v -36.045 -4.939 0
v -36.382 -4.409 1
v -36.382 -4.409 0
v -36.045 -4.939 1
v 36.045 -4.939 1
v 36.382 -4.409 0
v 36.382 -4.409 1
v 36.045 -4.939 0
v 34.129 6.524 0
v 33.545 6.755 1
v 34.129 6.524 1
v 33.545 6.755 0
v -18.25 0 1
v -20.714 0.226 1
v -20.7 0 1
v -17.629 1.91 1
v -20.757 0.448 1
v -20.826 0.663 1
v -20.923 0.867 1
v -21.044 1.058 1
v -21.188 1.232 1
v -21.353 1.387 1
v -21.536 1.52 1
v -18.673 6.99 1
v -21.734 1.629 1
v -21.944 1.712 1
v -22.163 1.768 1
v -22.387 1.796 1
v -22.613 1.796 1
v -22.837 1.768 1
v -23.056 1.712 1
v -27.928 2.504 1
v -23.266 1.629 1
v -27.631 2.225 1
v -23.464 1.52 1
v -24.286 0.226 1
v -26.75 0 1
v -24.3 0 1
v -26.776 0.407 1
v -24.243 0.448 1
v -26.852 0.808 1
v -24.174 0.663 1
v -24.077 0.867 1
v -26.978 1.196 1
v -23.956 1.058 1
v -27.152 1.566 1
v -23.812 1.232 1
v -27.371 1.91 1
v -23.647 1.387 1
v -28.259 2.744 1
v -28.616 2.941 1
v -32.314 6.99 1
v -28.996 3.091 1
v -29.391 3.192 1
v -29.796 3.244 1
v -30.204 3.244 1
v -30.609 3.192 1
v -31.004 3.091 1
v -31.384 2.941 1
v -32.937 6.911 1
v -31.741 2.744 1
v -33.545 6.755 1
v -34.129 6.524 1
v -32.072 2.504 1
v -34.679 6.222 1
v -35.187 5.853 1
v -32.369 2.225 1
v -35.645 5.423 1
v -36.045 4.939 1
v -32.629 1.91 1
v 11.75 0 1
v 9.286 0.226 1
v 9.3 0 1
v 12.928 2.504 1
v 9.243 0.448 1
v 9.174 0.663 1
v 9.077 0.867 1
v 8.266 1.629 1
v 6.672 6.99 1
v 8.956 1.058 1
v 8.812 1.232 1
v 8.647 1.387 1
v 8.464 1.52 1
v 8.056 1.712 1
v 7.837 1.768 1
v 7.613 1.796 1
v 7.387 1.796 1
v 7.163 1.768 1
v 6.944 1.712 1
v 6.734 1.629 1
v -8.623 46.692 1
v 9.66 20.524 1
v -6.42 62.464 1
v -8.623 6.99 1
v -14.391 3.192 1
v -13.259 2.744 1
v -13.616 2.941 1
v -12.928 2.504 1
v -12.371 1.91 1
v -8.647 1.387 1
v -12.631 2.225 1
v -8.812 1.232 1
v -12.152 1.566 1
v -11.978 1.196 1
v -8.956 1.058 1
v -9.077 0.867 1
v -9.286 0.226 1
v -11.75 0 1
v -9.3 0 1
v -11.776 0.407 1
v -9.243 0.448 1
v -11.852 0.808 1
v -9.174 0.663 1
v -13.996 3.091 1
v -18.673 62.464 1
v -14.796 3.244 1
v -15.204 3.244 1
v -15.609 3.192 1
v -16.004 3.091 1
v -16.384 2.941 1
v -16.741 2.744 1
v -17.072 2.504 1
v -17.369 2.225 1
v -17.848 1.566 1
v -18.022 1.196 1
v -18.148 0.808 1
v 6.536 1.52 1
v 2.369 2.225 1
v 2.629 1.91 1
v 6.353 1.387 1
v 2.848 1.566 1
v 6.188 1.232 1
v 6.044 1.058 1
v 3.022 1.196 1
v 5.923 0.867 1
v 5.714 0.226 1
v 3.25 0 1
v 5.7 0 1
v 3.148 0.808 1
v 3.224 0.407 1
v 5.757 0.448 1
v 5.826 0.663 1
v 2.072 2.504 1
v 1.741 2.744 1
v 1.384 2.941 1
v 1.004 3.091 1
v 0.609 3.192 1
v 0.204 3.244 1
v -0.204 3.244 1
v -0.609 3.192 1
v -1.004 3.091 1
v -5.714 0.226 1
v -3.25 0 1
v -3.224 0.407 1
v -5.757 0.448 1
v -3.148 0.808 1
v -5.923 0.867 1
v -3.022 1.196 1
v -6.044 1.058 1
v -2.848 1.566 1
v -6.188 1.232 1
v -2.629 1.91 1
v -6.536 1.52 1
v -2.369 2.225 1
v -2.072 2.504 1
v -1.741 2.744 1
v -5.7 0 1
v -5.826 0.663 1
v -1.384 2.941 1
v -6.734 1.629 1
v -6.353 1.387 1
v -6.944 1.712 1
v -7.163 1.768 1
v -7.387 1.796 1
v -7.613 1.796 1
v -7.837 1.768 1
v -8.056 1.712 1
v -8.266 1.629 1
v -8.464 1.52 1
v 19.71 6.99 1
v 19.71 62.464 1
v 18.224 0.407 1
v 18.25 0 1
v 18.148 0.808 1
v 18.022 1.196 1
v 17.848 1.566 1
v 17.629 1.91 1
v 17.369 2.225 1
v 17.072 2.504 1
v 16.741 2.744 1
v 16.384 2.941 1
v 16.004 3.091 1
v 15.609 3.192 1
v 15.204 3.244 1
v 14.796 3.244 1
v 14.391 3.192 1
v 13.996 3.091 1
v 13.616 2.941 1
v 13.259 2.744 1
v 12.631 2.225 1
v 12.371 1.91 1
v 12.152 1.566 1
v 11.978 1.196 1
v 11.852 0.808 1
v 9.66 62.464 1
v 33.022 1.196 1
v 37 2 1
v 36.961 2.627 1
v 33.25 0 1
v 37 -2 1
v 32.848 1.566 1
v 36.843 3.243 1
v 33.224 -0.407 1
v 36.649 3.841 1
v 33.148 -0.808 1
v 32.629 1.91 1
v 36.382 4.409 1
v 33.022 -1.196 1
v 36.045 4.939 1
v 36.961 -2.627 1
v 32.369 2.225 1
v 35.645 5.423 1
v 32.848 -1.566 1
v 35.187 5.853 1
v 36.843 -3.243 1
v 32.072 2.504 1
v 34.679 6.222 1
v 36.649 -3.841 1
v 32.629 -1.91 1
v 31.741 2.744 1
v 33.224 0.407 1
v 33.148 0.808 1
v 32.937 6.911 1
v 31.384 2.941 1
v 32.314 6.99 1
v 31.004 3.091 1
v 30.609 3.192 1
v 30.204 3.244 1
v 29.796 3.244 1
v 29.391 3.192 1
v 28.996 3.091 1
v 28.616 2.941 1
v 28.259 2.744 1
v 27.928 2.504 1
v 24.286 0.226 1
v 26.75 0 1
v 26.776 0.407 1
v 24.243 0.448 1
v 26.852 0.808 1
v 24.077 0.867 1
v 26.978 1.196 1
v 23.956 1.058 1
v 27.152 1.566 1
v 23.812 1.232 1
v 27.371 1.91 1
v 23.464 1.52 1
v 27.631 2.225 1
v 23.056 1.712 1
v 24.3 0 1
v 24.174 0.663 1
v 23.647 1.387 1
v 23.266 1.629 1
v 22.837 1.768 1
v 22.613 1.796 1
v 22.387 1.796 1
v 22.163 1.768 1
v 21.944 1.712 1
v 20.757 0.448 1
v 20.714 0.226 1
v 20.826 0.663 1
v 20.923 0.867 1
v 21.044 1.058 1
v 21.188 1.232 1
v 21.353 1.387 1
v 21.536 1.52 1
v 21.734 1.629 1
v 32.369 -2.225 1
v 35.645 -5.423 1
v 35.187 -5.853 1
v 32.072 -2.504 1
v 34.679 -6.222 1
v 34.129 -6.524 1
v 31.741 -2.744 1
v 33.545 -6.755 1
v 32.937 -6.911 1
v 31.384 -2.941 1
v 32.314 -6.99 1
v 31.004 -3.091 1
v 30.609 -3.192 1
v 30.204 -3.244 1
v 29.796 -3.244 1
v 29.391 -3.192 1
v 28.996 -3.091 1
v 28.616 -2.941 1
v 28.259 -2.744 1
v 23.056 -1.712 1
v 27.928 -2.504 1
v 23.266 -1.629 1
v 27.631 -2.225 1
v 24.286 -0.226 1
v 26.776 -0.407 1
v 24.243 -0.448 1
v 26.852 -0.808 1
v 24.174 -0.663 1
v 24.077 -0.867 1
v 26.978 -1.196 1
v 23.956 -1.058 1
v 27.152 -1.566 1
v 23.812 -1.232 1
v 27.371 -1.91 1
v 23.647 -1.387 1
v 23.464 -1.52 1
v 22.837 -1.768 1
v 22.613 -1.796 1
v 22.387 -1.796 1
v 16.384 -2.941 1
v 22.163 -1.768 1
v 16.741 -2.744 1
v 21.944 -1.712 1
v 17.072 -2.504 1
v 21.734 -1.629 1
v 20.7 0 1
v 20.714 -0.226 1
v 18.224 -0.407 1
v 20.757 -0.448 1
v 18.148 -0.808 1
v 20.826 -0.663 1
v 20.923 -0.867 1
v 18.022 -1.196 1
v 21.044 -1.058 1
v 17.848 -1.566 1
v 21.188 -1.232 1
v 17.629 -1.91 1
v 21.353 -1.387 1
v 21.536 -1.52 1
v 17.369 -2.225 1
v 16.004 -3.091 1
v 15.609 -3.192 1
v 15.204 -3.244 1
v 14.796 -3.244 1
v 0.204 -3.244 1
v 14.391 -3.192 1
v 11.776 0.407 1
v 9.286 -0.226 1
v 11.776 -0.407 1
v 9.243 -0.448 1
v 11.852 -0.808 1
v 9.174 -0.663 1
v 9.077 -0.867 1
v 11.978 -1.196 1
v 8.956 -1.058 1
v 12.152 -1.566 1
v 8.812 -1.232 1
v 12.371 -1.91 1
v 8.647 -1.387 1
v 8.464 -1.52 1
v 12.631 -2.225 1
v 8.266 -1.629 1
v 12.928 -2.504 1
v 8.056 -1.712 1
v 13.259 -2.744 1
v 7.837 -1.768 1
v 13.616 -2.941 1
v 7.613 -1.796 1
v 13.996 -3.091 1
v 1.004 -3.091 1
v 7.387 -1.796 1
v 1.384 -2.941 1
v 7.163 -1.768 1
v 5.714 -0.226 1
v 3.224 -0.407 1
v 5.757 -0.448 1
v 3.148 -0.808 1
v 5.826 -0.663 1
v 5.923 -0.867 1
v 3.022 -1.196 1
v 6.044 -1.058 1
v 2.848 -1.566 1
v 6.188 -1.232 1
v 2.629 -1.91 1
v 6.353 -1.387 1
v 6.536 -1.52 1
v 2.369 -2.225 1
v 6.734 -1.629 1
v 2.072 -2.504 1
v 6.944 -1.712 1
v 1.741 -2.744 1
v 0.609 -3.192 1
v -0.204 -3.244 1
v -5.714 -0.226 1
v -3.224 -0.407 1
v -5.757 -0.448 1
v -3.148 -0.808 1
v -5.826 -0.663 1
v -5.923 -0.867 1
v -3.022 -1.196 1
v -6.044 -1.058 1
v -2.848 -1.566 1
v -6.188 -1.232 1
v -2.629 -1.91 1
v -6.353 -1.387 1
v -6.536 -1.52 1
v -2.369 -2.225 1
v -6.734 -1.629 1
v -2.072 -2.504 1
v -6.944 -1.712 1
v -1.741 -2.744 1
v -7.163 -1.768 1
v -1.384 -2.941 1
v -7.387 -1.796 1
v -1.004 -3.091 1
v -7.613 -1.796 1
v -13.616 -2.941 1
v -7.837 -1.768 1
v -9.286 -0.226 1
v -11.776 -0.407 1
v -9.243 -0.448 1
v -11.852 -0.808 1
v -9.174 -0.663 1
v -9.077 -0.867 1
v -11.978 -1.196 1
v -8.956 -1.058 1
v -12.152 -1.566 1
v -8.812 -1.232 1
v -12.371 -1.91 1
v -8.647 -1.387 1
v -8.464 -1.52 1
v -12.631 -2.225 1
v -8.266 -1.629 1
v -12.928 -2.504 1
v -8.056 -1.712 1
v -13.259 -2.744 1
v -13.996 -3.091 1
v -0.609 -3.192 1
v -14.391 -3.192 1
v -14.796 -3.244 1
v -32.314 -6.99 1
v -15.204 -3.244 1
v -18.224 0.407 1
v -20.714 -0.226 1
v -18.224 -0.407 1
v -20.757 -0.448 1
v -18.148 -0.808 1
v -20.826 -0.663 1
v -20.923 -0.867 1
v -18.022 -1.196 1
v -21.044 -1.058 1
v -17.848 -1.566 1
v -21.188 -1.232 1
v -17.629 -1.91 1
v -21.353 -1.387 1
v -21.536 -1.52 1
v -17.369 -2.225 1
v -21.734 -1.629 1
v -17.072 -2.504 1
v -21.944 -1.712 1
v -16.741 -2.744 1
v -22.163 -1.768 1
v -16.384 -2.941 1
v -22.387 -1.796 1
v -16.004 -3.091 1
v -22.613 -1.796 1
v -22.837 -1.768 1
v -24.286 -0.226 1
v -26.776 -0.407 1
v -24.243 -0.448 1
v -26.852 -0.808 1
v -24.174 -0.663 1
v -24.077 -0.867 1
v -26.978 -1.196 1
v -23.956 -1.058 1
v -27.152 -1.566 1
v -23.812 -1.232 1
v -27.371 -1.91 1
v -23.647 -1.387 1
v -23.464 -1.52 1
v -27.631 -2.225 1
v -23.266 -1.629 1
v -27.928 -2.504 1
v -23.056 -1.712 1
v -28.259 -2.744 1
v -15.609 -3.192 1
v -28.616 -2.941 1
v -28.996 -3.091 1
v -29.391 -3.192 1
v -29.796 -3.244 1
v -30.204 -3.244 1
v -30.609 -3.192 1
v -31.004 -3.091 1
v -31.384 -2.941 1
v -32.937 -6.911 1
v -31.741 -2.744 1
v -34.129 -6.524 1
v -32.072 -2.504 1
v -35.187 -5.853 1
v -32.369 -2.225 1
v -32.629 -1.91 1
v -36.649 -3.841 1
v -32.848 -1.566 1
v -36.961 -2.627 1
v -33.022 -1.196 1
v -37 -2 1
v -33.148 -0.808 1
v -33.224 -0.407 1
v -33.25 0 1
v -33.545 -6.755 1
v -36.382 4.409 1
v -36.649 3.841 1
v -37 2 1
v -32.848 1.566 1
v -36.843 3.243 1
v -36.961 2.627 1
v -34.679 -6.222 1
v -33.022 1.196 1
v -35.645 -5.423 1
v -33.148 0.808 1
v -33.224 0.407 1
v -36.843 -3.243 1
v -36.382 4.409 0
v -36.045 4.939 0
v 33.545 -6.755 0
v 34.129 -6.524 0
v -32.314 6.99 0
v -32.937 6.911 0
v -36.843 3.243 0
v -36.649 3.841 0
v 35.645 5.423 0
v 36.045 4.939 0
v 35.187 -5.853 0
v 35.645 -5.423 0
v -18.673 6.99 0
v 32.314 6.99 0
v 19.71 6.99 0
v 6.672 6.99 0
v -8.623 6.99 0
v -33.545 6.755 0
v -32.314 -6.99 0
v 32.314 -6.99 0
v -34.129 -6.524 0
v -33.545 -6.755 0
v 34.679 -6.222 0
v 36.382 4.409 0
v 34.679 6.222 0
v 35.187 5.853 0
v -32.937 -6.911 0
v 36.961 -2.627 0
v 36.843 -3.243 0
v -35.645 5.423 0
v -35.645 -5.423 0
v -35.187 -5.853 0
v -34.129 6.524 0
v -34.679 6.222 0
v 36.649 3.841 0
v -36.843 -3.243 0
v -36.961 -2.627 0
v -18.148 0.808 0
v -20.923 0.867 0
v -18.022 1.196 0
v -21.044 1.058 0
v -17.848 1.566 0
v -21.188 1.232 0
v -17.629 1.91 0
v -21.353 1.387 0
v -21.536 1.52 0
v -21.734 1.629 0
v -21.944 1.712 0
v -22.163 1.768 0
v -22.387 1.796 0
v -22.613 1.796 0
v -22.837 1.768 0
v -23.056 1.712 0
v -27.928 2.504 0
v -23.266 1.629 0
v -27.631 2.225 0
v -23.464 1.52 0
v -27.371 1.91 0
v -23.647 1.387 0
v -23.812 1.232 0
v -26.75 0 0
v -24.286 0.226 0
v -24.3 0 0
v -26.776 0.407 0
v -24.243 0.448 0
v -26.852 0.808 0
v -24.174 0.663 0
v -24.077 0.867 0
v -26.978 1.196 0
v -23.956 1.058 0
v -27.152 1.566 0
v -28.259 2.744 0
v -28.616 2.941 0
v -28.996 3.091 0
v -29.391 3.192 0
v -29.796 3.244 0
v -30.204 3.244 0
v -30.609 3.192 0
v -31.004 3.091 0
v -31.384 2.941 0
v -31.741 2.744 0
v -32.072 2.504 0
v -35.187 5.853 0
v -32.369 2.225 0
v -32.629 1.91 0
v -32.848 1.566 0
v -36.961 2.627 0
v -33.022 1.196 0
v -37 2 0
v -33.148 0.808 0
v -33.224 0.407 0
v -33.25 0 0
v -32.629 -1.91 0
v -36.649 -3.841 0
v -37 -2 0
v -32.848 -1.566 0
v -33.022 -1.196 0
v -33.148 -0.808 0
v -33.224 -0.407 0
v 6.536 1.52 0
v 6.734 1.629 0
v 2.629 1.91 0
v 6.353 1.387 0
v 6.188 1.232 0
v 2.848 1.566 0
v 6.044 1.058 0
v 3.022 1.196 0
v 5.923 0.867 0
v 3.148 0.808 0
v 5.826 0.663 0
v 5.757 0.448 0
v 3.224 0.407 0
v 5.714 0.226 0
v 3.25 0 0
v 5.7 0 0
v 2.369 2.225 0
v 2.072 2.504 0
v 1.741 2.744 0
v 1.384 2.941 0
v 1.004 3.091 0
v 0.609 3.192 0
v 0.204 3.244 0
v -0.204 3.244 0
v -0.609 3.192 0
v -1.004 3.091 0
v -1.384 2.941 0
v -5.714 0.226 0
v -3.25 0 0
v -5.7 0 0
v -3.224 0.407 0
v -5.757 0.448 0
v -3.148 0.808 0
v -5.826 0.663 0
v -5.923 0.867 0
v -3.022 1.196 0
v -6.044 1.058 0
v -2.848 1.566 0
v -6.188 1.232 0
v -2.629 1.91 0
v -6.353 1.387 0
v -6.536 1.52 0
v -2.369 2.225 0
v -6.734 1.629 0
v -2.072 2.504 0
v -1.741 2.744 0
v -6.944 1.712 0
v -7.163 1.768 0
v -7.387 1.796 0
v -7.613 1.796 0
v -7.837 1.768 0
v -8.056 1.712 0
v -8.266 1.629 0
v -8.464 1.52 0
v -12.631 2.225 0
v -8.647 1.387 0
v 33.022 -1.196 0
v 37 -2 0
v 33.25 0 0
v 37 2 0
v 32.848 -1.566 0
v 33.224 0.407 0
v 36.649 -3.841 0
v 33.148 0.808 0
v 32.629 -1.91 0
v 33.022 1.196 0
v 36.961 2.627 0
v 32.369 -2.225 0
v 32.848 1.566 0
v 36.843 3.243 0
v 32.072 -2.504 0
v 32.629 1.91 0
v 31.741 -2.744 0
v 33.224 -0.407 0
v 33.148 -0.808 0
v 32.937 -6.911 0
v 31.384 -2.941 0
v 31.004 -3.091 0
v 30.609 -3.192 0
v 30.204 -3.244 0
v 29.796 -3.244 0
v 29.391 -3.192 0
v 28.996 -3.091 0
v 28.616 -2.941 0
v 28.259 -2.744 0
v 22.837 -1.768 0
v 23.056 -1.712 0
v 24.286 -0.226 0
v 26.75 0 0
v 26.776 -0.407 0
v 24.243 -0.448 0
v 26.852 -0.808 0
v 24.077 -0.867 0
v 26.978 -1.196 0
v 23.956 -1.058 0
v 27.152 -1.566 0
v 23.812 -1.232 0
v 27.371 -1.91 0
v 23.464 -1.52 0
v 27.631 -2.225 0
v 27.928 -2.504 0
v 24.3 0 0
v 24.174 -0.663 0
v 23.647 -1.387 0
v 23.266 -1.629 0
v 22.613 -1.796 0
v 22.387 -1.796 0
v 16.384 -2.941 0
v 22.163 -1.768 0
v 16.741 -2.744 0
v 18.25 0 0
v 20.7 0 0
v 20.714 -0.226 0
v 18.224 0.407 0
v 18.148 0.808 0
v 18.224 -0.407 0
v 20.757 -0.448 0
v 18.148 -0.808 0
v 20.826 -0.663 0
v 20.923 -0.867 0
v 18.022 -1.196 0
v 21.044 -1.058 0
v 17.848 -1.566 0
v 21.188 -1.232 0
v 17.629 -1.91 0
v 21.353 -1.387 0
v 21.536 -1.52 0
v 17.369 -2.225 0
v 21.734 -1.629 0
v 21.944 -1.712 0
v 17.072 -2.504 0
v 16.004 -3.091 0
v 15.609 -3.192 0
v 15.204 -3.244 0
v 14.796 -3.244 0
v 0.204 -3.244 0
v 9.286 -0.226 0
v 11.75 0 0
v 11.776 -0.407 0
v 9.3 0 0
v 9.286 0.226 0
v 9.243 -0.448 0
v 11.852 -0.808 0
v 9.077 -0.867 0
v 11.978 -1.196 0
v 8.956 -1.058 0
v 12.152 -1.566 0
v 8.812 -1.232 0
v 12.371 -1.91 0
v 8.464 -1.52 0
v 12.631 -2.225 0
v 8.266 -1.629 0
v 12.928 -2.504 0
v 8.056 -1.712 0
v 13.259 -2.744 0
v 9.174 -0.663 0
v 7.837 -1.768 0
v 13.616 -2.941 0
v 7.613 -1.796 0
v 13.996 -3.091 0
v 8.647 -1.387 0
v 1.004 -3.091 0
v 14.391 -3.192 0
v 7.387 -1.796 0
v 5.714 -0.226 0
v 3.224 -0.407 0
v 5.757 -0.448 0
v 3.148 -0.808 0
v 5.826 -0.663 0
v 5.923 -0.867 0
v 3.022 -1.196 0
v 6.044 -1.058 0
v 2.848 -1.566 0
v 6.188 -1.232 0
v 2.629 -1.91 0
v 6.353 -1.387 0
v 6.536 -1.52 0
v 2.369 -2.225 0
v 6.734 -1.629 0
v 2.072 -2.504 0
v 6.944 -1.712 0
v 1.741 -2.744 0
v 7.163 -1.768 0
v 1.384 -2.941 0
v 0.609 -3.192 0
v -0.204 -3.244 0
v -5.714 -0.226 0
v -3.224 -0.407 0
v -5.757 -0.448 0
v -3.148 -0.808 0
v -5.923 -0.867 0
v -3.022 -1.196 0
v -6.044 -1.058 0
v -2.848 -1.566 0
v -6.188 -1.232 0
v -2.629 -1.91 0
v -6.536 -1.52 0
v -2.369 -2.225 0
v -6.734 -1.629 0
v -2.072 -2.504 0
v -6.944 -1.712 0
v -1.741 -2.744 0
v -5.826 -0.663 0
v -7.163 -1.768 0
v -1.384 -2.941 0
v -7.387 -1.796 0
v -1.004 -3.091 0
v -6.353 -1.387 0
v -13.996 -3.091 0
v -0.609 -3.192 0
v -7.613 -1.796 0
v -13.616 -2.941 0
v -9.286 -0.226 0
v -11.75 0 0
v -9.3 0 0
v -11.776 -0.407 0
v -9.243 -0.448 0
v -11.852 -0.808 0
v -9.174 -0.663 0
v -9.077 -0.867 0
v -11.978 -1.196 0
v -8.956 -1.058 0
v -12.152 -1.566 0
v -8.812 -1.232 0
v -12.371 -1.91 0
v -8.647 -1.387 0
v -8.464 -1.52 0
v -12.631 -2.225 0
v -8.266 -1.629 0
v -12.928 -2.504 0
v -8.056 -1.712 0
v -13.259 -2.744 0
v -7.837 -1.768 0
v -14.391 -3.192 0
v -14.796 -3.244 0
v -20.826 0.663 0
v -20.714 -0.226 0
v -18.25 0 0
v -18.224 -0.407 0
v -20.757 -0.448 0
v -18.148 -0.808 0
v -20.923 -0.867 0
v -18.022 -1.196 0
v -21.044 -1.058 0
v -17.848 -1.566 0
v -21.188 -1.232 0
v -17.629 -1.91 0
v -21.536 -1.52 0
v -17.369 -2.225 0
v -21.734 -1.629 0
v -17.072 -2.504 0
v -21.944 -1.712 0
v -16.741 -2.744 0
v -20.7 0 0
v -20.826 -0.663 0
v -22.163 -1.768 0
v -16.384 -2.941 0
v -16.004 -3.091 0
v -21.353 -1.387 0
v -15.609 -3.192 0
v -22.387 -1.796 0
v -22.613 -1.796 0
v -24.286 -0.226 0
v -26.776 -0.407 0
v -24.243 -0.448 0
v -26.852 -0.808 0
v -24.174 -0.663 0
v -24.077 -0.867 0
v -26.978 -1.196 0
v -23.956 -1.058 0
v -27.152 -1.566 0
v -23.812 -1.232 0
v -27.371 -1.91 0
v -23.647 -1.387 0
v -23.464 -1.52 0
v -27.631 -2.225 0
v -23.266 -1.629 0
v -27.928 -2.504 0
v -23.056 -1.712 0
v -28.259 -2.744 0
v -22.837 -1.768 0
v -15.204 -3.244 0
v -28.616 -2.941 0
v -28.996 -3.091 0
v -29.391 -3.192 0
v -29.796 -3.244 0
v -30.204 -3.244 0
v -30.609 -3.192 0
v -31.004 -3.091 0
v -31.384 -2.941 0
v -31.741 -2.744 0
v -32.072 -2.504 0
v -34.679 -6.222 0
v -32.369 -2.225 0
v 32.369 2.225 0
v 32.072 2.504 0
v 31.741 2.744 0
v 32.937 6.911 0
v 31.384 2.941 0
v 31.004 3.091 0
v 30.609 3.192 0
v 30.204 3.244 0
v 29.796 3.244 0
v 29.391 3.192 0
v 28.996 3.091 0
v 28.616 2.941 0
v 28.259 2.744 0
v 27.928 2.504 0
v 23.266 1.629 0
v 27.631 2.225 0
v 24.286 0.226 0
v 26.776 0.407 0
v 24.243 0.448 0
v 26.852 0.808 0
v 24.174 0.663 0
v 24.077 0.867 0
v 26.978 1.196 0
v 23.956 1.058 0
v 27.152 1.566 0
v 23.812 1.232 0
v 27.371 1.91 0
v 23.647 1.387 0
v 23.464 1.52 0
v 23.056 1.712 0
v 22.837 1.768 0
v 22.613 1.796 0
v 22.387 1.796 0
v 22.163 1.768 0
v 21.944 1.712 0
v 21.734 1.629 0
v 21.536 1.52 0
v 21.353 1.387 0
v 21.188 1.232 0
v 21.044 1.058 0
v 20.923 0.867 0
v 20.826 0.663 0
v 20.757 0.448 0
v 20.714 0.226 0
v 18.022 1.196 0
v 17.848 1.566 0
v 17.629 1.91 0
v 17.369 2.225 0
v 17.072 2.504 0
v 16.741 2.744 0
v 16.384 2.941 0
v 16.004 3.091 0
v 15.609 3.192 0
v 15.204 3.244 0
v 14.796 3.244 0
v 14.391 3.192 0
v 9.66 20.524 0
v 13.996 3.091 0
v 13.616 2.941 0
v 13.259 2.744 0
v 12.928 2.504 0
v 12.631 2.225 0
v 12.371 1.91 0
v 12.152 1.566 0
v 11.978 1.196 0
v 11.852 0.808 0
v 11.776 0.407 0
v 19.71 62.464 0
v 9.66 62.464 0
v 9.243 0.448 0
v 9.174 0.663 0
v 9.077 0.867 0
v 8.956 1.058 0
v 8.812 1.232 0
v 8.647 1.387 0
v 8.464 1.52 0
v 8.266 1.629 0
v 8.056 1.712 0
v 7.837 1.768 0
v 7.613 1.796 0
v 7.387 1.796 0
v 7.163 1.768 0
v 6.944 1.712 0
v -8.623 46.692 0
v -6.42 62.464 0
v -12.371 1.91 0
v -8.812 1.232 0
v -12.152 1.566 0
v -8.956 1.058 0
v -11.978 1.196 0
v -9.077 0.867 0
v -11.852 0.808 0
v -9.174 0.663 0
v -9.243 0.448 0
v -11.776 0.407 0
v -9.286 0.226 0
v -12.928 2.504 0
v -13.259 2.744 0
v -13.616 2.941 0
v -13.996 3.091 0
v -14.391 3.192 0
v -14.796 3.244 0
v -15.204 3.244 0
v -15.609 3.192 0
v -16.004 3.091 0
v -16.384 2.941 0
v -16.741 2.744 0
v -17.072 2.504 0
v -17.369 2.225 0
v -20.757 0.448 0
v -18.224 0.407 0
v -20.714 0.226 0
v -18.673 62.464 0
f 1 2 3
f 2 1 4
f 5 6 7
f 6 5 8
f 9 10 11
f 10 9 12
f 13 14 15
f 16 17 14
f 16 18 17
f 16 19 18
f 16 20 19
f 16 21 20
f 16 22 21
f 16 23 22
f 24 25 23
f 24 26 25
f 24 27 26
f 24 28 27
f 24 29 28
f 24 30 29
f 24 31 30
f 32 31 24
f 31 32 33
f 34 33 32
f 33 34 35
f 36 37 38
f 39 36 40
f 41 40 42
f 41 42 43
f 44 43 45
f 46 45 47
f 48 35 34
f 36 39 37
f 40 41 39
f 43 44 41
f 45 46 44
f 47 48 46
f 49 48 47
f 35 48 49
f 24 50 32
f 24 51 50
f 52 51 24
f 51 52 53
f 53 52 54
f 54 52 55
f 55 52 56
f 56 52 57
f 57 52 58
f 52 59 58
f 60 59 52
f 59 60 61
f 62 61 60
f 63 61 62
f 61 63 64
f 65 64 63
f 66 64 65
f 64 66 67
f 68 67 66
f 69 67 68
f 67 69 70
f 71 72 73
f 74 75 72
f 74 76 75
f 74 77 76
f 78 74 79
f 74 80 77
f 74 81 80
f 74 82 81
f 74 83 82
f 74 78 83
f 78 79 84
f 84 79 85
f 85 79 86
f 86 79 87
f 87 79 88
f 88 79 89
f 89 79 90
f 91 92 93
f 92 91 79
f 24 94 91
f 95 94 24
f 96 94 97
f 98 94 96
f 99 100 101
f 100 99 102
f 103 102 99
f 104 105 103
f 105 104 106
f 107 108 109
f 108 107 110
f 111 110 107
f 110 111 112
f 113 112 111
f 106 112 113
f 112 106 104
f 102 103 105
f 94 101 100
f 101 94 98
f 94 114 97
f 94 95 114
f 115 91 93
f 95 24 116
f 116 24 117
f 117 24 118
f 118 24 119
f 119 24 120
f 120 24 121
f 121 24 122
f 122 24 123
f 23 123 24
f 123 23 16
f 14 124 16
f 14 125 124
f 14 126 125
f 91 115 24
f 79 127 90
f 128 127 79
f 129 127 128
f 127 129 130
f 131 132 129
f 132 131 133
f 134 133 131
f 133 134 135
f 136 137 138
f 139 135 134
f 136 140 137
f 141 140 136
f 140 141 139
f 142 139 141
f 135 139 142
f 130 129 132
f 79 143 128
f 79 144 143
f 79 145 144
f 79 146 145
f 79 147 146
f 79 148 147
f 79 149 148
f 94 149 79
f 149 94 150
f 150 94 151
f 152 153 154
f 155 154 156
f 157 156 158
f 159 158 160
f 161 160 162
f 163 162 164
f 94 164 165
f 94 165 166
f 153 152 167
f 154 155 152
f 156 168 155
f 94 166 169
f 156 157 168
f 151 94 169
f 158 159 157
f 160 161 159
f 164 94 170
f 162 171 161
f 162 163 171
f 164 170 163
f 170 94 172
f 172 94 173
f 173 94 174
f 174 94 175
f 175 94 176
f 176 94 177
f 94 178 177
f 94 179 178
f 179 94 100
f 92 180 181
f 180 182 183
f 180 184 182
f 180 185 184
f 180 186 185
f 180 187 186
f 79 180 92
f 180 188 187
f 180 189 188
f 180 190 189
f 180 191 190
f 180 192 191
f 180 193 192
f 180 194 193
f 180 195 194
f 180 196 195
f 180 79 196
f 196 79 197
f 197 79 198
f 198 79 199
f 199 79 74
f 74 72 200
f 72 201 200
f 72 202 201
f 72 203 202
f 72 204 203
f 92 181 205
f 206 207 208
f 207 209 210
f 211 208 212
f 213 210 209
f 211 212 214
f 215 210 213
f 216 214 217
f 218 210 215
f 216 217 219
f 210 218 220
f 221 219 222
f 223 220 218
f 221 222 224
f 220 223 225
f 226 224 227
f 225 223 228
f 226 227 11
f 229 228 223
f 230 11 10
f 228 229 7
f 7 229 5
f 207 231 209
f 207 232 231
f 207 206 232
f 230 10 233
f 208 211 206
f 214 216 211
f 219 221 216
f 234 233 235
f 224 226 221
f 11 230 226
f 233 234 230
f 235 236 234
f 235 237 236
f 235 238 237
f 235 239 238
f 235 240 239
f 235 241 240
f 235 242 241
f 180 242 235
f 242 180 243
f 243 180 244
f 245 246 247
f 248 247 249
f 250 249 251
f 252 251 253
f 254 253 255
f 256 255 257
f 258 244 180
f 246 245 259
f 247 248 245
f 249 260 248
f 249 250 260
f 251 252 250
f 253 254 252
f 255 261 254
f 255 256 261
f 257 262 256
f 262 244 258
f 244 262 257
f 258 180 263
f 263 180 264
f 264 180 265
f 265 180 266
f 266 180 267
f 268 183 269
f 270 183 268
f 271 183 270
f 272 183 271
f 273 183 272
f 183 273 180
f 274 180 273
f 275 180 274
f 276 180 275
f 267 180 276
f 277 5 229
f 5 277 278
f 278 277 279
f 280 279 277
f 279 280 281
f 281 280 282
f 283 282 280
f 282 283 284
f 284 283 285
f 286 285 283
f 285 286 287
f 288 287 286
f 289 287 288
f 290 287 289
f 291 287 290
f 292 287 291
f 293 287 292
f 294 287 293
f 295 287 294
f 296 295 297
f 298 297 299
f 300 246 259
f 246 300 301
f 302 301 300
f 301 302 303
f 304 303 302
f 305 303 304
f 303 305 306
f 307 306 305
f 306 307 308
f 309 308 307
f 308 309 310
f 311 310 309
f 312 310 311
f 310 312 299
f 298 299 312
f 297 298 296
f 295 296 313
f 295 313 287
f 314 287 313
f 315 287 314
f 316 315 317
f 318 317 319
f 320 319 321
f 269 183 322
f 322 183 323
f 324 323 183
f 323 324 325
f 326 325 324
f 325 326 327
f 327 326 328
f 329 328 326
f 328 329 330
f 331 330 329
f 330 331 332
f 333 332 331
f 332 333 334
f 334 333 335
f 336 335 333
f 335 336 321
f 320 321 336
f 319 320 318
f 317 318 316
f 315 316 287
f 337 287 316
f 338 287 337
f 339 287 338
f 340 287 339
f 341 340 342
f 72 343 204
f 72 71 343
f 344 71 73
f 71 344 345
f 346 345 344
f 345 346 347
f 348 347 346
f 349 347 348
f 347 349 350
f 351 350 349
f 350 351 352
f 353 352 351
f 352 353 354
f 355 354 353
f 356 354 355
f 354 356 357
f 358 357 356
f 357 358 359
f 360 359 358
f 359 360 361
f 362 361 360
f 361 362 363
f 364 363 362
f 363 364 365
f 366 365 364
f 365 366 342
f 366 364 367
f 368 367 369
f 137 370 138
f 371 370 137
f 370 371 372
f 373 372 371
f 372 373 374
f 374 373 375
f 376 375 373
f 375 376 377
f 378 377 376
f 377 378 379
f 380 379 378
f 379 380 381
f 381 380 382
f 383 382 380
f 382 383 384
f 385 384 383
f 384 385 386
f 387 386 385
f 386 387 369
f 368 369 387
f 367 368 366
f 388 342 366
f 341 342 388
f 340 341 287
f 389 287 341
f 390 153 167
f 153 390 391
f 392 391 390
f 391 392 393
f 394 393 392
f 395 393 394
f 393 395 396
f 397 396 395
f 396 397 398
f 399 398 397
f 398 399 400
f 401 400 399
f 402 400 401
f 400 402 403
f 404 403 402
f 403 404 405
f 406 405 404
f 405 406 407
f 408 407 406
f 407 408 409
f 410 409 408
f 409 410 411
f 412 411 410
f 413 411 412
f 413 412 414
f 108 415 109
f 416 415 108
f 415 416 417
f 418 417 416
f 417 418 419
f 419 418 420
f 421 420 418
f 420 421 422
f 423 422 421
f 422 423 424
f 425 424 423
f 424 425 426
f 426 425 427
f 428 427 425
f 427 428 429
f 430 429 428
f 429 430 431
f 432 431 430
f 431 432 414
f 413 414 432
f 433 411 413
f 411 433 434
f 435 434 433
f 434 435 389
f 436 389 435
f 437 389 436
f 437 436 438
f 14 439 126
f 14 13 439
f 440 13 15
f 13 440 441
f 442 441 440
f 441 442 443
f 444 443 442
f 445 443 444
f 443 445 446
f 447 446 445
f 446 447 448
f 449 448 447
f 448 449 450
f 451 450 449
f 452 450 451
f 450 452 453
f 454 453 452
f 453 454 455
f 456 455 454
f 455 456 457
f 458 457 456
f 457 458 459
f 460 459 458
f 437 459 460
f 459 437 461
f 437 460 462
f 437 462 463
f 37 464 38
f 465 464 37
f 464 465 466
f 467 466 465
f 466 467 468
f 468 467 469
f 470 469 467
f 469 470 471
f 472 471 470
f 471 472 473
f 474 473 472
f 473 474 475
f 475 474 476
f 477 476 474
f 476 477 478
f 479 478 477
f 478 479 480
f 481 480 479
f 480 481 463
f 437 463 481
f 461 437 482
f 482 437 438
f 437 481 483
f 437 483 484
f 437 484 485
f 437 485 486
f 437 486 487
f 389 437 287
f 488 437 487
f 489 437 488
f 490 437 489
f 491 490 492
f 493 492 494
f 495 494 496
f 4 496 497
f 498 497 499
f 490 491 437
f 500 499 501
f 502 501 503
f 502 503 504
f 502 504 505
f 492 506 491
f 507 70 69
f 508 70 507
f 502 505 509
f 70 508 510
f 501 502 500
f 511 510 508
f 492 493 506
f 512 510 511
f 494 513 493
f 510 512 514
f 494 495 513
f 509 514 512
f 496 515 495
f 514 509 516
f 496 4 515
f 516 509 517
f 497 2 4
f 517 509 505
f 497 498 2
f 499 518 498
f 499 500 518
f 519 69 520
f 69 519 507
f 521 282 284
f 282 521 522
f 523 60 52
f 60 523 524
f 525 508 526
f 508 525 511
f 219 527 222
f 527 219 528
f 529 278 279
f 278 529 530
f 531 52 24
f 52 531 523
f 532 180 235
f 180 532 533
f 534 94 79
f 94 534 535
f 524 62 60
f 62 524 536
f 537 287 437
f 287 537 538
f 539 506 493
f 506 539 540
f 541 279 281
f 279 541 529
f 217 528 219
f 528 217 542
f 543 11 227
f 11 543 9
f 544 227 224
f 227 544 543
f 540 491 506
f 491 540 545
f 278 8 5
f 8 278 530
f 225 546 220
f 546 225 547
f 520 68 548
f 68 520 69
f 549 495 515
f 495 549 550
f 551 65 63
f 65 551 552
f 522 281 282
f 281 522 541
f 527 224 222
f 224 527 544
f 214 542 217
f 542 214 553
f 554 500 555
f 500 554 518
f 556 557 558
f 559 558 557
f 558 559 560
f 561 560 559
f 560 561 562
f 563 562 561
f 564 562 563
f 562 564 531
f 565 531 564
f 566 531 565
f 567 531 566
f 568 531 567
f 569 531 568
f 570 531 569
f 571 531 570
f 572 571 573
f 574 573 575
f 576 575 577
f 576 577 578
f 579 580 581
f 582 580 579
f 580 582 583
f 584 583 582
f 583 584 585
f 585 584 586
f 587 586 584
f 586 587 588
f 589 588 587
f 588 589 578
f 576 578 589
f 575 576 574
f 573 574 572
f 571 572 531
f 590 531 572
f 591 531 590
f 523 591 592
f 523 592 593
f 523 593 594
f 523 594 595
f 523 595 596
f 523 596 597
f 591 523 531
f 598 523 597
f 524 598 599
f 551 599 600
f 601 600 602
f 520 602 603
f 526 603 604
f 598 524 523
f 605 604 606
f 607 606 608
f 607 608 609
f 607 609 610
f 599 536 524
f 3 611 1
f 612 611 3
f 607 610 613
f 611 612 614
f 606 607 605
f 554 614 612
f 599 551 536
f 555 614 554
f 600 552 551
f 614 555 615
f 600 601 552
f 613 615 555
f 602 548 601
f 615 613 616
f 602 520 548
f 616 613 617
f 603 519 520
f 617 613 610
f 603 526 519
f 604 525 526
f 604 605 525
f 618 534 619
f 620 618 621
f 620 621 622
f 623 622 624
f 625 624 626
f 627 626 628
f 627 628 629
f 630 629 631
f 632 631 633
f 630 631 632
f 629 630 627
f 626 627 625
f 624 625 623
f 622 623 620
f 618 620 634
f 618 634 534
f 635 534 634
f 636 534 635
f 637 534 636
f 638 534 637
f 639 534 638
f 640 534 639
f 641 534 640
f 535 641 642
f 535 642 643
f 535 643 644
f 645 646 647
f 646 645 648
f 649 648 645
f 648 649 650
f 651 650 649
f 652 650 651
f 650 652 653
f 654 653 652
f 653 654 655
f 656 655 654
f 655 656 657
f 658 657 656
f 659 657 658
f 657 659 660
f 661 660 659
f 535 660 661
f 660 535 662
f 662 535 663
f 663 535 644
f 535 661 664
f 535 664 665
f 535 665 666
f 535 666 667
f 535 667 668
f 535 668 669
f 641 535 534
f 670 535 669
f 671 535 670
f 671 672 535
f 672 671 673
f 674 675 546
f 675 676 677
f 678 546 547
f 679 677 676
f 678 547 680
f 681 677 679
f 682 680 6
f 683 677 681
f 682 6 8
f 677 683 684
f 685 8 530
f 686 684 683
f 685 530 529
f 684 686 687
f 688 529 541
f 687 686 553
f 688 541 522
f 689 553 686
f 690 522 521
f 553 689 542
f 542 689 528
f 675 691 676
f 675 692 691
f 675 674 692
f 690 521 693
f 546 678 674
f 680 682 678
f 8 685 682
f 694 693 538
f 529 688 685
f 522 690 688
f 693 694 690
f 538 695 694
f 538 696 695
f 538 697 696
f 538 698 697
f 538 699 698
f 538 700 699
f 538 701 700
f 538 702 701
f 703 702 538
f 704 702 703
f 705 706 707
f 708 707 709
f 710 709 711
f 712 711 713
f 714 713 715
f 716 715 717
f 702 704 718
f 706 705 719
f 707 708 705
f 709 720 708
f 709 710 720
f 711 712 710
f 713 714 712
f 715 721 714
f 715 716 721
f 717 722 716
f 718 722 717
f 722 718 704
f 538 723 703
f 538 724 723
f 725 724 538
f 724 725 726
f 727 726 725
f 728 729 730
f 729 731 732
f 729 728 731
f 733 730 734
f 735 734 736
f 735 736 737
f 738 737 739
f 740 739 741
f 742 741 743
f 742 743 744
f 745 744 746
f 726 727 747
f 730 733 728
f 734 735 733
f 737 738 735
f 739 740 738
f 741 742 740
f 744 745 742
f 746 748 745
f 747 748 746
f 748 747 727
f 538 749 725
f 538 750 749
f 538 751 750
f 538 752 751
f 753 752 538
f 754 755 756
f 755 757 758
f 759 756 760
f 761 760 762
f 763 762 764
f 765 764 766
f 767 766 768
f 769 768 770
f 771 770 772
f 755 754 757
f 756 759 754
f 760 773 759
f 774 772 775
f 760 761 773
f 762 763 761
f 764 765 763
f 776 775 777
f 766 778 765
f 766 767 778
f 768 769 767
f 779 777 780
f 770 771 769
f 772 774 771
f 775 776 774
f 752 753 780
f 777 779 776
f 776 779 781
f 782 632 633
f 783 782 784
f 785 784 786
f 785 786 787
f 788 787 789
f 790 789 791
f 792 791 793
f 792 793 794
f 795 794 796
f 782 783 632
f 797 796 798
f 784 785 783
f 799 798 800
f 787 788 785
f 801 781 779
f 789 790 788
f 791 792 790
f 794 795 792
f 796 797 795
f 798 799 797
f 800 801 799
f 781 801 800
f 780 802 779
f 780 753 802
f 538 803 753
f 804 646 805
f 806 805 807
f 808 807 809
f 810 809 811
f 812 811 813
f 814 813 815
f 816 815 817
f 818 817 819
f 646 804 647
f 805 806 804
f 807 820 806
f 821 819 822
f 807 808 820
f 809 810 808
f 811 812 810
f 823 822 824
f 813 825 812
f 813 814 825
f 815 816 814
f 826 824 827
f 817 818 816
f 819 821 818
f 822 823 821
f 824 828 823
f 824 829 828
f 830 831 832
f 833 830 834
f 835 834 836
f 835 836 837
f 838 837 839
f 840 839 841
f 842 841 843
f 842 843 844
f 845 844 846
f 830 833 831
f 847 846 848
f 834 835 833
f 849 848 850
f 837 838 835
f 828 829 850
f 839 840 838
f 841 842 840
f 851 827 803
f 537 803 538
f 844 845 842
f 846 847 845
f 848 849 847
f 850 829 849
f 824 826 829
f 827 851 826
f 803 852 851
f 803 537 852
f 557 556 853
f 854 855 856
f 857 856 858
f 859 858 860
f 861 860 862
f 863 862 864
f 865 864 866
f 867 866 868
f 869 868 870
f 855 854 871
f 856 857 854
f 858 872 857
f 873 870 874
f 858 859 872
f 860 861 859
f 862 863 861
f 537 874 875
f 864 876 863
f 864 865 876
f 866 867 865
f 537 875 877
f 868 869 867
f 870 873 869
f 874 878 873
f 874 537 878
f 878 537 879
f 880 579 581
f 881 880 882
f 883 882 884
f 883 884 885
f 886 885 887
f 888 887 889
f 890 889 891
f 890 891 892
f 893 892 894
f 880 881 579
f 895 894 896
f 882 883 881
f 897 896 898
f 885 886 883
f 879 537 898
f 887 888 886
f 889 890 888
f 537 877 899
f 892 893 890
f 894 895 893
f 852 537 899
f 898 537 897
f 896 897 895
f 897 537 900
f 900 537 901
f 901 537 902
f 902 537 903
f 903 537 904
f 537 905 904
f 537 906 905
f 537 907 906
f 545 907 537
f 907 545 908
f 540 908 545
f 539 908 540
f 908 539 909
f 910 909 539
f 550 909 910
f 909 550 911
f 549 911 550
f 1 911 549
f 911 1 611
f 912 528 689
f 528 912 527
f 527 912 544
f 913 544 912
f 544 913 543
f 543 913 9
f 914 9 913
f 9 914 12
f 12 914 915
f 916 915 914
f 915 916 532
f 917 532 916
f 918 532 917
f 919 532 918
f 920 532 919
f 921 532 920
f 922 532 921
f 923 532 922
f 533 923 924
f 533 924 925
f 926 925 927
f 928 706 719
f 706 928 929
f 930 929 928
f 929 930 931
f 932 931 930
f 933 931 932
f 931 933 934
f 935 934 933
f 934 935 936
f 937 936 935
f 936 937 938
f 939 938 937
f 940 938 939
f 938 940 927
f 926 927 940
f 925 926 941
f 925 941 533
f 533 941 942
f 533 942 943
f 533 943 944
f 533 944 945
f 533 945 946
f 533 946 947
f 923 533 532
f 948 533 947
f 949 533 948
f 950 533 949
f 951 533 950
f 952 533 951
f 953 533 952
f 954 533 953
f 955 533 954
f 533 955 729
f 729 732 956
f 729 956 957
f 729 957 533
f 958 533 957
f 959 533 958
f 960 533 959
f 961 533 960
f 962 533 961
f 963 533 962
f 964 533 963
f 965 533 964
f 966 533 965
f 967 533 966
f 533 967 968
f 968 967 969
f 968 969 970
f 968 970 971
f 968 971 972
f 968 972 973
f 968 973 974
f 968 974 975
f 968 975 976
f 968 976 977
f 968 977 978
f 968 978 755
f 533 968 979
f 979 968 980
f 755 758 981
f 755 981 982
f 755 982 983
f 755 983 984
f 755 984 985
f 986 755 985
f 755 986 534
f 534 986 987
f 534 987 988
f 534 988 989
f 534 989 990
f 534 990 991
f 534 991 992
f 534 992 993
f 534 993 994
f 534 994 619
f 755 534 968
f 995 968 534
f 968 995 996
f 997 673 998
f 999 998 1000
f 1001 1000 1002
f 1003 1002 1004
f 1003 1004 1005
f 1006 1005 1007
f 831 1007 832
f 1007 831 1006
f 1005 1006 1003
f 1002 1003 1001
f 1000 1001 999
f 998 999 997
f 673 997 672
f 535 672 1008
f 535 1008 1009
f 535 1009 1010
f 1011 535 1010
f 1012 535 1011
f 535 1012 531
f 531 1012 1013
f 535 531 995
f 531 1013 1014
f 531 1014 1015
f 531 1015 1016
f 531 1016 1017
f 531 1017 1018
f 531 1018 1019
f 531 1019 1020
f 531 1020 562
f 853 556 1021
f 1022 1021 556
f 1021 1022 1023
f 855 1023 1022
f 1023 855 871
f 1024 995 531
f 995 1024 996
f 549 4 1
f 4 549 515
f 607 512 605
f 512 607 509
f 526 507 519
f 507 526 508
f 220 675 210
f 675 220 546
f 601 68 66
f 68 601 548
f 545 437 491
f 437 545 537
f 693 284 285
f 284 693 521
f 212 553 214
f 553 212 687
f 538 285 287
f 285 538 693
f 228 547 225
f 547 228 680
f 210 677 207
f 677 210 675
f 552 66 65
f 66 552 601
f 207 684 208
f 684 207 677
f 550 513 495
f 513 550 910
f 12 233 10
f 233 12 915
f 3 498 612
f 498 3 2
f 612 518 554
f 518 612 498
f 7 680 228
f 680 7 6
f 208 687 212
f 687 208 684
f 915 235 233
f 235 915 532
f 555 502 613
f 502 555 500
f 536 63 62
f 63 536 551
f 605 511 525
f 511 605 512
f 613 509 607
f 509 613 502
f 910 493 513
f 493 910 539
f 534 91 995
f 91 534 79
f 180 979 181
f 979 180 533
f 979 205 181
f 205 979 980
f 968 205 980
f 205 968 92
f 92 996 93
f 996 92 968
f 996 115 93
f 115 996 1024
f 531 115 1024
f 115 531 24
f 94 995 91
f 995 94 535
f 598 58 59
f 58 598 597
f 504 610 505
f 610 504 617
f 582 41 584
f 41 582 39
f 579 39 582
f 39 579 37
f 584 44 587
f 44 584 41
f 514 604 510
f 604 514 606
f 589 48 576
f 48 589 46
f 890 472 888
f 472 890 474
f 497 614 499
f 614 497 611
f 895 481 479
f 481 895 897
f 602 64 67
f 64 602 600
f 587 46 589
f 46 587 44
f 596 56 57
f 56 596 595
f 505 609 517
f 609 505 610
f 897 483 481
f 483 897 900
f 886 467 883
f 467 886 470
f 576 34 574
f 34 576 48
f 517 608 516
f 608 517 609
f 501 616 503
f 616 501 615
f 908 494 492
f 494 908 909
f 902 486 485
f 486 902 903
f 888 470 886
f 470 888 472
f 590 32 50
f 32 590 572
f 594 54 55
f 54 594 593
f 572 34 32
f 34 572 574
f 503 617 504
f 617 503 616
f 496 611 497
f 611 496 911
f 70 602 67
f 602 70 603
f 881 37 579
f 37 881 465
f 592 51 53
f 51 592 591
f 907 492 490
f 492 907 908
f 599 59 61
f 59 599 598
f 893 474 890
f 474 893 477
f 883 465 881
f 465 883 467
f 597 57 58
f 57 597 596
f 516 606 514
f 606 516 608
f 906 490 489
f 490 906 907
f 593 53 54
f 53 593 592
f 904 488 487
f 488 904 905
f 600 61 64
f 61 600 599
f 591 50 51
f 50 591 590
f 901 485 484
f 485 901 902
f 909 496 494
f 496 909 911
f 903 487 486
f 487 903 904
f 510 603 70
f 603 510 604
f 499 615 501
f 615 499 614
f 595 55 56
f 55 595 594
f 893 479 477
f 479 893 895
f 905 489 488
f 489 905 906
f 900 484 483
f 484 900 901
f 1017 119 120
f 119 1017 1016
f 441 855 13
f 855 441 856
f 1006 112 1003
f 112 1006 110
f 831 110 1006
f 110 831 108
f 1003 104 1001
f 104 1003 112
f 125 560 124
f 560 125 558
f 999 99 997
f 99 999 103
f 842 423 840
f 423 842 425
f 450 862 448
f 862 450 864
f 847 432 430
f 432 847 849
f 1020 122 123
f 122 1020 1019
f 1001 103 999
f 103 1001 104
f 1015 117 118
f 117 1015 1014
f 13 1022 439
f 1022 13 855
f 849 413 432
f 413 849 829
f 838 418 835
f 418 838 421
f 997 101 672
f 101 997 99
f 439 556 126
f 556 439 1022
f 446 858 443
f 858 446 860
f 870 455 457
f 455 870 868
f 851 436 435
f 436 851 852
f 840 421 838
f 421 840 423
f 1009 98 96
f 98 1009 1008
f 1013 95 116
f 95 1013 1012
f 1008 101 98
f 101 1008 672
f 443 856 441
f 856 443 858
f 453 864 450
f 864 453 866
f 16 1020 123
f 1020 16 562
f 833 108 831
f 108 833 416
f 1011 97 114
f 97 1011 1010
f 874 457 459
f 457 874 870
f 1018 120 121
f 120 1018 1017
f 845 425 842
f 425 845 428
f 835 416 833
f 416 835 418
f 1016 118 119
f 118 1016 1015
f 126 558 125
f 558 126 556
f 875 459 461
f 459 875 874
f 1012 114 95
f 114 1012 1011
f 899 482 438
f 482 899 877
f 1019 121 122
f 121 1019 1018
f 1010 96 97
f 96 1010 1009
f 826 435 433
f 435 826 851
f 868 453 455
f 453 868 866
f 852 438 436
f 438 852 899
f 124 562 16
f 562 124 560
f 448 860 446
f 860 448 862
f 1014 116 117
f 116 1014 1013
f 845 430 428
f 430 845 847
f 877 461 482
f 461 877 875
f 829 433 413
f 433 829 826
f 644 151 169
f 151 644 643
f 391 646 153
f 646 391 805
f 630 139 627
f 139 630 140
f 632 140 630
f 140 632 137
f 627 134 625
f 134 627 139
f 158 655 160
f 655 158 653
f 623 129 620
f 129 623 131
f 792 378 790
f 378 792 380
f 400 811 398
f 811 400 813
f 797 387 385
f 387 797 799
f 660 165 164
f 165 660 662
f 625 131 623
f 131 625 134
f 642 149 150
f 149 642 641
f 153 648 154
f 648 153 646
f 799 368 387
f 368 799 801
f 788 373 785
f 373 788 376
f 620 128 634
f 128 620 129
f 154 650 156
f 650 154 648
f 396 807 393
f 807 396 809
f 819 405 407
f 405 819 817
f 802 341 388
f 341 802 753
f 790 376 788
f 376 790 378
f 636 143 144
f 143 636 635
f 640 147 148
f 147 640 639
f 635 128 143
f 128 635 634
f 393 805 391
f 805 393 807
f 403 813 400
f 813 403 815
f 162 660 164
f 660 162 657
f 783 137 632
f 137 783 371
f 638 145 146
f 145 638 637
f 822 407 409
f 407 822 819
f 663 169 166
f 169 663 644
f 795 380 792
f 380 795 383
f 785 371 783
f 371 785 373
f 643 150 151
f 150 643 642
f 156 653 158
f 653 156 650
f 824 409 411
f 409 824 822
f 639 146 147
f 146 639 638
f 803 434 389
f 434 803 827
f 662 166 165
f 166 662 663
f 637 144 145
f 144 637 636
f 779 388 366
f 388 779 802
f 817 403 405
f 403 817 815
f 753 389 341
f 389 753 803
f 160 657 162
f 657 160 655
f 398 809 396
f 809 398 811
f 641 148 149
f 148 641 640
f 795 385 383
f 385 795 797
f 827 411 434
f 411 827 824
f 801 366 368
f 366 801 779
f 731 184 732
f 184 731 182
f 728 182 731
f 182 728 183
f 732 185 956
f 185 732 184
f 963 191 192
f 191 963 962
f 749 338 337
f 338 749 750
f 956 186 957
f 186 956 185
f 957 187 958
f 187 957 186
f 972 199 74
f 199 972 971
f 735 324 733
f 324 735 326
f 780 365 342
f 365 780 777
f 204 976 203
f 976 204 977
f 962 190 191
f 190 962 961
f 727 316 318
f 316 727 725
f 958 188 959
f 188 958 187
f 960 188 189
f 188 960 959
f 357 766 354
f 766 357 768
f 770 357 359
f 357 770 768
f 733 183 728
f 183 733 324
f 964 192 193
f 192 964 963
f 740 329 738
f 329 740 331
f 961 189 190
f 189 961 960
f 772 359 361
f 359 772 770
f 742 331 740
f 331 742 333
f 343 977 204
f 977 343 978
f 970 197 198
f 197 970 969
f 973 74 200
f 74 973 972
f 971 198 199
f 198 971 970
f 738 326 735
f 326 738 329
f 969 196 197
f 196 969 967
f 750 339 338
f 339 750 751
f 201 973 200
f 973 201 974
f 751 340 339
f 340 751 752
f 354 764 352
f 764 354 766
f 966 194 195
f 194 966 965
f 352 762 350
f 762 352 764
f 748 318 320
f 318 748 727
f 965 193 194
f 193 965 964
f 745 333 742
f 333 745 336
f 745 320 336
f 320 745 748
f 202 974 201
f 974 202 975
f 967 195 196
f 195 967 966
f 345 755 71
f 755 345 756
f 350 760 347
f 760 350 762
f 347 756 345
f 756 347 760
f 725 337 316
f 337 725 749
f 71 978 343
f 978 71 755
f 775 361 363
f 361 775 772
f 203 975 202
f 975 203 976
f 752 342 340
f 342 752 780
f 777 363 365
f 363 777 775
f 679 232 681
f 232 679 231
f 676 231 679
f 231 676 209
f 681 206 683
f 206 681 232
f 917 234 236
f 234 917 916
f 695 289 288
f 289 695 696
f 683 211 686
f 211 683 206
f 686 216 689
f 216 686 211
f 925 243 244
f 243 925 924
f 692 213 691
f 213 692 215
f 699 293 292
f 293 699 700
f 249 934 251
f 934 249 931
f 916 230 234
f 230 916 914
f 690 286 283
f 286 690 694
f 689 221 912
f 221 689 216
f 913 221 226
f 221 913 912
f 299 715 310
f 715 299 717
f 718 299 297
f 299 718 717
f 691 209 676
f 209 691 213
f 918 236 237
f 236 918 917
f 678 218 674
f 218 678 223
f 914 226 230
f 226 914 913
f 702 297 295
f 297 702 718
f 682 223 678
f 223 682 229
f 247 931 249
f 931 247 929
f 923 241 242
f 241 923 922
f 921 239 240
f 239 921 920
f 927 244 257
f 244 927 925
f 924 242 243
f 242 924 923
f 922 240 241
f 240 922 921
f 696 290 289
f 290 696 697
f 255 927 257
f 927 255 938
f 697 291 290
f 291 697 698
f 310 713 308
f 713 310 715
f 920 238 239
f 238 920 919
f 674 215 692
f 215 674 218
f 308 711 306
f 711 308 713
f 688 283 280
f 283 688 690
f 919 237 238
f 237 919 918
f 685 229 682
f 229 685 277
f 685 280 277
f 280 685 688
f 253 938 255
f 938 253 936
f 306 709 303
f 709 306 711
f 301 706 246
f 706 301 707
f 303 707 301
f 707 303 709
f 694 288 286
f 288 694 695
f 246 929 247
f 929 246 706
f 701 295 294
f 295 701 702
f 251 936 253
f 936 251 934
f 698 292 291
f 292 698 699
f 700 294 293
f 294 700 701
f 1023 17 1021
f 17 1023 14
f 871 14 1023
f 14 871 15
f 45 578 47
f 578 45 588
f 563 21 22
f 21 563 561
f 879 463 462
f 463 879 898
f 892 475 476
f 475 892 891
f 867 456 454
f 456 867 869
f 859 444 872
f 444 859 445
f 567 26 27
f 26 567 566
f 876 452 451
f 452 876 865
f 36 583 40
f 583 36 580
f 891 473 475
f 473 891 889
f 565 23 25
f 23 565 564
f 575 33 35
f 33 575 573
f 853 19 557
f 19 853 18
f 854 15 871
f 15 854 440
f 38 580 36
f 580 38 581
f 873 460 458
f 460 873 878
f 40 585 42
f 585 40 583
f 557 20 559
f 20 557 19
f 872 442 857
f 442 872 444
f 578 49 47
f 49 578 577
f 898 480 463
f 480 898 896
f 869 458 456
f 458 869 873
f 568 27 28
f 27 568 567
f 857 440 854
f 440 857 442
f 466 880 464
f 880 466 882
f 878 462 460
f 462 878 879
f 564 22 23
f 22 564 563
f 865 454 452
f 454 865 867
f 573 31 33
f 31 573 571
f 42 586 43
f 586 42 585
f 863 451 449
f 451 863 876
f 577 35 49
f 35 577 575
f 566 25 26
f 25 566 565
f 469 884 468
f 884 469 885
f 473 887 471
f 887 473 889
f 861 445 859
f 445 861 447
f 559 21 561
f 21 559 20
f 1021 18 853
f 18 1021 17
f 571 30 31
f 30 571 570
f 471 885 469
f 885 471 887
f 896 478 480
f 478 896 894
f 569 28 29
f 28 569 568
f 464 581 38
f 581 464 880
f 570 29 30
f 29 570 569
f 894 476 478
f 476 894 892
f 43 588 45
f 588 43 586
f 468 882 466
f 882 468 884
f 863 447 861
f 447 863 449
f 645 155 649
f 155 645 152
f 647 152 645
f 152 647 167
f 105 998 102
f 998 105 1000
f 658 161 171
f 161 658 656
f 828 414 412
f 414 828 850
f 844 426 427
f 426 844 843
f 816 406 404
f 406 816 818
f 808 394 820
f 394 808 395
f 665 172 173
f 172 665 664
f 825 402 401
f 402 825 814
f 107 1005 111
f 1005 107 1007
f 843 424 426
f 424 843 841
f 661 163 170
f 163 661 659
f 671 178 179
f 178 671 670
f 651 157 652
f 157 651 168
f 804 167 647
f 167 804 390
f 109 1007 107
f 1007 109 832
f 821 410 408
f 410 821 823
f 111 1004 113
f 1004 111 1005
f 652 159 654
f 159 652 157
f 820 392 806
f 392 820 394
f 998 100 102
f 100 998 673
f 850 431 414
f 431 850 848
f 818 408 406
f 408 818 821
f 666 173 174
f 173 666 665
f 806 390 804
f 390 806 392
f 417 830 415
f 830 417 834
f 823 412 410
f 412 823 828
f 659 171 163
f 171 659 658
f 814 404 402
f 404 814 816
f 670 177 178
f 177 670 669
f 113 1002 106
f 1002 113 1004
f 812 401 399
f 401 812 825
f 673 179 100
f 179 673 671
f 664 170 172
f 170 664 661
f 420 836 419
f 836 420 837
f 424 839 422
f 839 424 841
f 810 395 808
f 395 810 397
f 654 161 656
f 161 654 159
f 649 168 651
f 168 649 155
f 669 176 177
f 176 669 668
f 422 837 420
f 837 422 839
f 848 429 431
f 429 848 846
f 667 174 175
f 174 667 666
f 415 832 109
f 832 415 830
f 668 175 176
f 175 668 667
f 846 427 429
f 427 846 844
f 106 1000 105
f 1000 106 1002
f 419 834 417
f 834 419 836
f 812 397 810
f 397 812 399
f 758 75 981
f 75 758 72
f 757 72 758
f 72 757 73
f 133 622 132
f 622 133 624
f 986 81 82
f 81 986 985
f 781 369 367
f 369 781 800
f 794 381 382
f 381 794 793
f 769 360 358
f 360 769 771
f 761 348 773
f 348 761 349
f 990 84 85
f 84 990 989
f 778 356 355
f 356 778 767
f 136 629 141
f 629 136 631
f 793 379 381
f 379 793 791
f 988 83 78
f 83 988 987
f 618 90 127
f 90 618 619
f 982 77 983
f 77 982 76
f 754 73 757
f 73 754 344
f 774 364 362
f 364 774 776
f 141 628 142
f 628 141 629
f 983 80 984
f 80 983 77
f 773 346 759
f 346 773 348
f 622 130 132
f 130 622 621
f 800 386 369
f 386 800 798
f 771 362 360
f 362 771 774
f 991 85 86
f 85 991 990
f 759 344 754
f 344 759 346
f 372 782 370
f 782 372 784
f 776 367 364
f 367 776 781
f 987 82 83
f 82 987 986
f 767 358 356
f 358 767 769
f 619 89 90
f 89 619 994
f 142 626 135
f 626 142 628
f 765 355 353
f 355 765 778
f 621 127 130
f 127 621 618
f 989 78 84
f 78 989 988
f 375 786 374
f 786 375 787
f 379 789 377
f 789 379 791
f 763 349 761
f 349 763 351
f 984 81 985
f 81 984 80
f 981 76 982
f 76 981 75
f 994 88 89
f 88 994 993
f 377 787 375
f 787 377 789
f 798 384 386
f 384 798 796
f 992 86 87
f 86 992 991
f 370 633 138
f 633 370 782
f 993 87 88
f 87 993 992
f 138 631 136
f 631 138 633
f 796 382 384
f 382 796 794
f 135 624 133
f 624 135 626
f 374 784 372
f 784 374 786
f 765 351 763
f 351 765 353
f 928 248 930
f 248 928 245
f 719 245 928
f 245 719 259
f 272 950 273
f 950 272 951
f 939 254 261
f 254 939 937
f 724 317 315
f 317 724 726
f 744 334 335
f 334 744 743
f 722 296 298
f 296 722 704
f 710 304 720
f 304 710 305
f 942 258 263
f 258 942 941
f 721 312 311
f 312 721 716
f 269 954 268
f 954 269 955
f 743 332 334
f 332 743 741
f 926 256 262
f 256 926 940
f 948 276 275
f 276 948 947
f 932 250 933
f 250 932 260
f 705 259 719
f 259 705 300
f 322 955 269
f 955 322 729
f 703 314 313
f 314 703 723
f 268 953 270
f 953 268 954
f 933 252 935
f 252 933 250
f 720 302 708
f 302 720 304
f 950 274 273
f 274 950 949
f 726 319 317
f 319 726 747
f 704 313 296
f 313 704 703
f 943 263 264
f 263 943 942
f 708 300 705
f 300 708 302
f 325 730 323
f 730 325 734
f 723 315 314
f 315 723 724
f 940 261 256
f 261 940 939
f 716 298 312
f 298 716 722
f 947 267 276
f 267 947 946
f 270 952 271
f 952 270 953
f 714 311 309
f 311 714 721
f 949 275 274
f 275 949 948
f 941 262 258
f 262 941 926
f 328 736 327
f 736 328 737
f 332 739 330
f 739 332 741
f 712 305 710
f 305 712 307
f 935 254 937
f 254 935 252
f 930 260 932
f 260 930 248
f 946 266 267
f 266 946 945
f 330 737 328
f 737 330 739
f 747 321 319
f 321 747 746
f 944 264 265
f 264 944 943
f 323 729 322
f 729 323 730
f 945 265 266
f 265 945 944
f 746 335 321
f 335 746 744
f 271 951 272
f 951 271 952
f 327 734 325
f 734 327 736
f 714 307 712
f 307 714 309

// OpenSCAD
$fn = 50;


difference() {
	union() {
		hull() {
			translate(v = [-32.0000000000, 2.0000000000, 0]) {
				cylinder(h = 1, r = 5);
			}
			translate(v = [32.0000000000, 2.0000000000, 0]) {
				cylinder(h = 1, r = 5);
			}
			translate(v = [-32.0000000000, -2.0000000000, 0]) {
				cylinder(h = 1, r = 5);
			}
			translate(v = [32.0000000000, -2.0000000000, 0]) {
				cylinder(h = 1, r = 5);
			}
		}
		translate(v = [0, 61.1111111111, 0]) {
			linear_extrude(height = 1) {
				text(font = "DejaVu Sans Mono:style=Bold", halign = "center", size = 57.0000000000, text = "N", valign = "top");
			}
		}
	}
	union() {
		translate(v = [-30.0000000000, 0.0000000000, 0]) {
			translate(v = [0, 0, -100]) {
				cylinder(h = 200, r = 3.2500000000);
			}
		}
		translate(v = [-15.0000000000, 0.0000000000, 0]) {
			translate(v = [0, 0, -100]) {
				cylinder(h = 200, r = 3.2500000000);
			}
		}
		translate(v = [0, 0, -100]) {
			cylinder(h = 200, r = 3.2500000000);
		}
		translate(v = [15.0000000000, 0.0000000000, 0]) {
			translate(v = [0, 0, -100]) {
				cylinder(h = 200, r = 3.2500000000);
			}
		}
		translate(v = [30.0000000000, 0.0000000000, 0]) {
			translate(v = [0, 0, -100]) {
				cylinder(h = 200, r = 3.2500000000);
			}
		}
		translate(v = [-30.0000000000, 0.0000000000, 0]) {
			translate(v = [0, 0, -100]) {
				cylinder(h = 200, r = 1.8000000000);
			}
		}
		translate(v = [-22.5000000000, 0.0000000000, 0]) {
			translate(v = [0, 0, -100]) {
				cylinder(h = 200, r = 1.8000000000);
			}
		}
		translate(v = [-15.0000000000, 0.0000000000, 0]) {
			translate(v = [0, 0, -100]) {
				cylinder(h = 200, r = 1.8000000000);
			}
		}
		translate(v = [-7.5000000000, 0.0000000000, 0]) {
			translate(v = [0, 0, -100]) {
				cylinder(h = 200, r = 1.8000000000);
			}
		}
		translate(v = [0, 0, -100]) {
			cylinder(h = 200, r = 1.8000000000);
		}
		translate(v = [7.5000000000, 0.0000000000, 0]) {
			translate(v = [0, 0, -100]) {
				cylinder(h = 200, r = 1.8000000000);
			}
		}
		translate(v = [15.0000000000, 0.0000000000, 0]) {
			translate(v = [0, 0, -100]) {
				cylinder(h = 200, r = 1.8000000000);
			}
		}
		translate(v = [22.5000000000, 0.0000000000, 0]) {
			translate(v = [0, 0, -100]) {
				cylinder(h = 200, r = 1.8000000000);
			}
		}
		translate(v = [30.0000000000, 0.0000000000, 0]) {
			translate(v = [0, 0, -100]) {
				cylinder(h = 200, r = 1.8000000000);
			}
		}
	}
}
